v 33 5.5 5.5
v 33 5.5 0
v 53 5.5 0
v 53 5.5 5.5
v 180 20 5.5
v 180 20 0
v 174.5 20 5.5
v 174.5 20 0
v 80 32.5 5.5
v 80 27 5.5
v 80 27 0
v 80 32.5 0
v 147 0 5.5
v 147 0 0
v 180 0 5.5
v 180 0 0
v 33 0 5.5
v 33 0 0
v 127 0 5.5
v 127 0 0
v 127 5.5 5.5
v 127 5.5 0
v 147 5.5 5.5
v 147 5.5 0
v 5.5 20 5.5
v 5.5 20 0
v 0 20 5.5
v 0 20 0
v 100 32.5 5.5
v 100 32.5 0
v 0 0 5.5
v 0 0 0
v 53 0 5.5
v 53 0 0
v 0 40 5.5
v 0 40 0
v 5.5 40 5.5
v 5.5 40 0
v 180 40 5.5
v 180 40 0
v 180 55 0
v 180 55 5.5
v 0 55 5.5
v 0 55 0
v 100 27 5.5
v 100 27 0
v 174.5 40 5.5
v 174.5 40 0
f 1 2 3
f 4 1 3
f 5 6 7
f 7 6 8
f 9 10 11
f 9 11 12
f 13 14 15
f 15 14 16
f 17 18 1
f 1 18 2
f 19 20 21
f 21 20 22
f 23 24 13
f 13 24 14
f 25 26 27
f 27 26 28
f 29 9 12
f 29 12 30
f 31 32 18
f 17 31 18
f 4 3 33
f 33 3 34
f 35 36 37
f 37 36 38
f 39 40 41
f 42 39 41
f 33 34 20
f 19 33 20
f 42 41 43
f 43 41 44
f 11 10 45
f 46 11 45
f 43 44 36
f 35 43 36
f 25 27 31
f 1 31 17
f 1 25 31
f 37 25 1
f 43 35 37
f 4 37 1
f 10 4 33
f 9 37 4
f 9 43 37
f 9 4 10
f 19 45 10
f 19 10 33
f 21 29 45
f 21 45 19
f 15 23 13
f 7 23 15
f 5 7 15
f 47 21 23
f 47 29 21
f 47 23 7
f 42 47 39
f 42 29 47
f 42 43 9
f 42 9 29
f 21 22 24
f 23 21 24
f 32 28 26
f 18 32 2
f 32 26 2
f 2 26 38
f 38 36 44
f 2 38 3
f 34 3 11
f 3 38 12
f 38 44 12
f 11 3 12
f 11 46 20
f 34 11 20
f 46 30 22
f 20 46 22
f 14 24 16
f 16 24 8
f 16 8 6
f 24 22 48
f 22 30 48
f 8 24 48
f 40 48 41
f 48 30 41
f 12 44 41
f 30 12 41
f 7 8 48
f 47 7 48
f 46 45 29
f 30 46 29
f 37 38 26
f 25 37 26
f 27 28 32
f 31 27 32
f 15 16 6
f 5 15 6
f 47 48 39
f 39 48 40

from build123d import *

# Parameters (mm, degrees)
BOSS_EXTRUDE1_DEPTH = 5.5
SKETCH3_W           = 20
SKETCH3_H           = 5.5
CUT_EXTRUDE2_DEPTH  = 5.5


with BuildPart() as part:
    # Sketch1 → Boss-Extrude1 (new body)
    with BuildSketch(Plane.XY):
        Polygon((0, 0), (33, 0), (33, 5.5), (53, 5.5), (53, 0), (127, 0), (127, 5.5), (147, 5.5), (147, 0), (180, 0), (180, 20), (174.5, 20), (174.5, 40), (180, 40), (180, 55), (0, 55), (0, 40), (5.5, 40), (5.5, 20), (0, 20), align=None)
    extrude(amount=BOSS_EXTRUDE1_DEPTH)

    # Sketch3 → Cut-Extrude2 (cut)
    with BuildSketch(Plane.XY.offset(5.5)):
        with Locations((90, 29.75)):
            Rectangle(SKETCH3_W, SKETCH3_H)
    extrude(amount=-CUT_EXTRUDE2_DEPTH, mode=Mode.SUBTRACT)


solid = part.part
